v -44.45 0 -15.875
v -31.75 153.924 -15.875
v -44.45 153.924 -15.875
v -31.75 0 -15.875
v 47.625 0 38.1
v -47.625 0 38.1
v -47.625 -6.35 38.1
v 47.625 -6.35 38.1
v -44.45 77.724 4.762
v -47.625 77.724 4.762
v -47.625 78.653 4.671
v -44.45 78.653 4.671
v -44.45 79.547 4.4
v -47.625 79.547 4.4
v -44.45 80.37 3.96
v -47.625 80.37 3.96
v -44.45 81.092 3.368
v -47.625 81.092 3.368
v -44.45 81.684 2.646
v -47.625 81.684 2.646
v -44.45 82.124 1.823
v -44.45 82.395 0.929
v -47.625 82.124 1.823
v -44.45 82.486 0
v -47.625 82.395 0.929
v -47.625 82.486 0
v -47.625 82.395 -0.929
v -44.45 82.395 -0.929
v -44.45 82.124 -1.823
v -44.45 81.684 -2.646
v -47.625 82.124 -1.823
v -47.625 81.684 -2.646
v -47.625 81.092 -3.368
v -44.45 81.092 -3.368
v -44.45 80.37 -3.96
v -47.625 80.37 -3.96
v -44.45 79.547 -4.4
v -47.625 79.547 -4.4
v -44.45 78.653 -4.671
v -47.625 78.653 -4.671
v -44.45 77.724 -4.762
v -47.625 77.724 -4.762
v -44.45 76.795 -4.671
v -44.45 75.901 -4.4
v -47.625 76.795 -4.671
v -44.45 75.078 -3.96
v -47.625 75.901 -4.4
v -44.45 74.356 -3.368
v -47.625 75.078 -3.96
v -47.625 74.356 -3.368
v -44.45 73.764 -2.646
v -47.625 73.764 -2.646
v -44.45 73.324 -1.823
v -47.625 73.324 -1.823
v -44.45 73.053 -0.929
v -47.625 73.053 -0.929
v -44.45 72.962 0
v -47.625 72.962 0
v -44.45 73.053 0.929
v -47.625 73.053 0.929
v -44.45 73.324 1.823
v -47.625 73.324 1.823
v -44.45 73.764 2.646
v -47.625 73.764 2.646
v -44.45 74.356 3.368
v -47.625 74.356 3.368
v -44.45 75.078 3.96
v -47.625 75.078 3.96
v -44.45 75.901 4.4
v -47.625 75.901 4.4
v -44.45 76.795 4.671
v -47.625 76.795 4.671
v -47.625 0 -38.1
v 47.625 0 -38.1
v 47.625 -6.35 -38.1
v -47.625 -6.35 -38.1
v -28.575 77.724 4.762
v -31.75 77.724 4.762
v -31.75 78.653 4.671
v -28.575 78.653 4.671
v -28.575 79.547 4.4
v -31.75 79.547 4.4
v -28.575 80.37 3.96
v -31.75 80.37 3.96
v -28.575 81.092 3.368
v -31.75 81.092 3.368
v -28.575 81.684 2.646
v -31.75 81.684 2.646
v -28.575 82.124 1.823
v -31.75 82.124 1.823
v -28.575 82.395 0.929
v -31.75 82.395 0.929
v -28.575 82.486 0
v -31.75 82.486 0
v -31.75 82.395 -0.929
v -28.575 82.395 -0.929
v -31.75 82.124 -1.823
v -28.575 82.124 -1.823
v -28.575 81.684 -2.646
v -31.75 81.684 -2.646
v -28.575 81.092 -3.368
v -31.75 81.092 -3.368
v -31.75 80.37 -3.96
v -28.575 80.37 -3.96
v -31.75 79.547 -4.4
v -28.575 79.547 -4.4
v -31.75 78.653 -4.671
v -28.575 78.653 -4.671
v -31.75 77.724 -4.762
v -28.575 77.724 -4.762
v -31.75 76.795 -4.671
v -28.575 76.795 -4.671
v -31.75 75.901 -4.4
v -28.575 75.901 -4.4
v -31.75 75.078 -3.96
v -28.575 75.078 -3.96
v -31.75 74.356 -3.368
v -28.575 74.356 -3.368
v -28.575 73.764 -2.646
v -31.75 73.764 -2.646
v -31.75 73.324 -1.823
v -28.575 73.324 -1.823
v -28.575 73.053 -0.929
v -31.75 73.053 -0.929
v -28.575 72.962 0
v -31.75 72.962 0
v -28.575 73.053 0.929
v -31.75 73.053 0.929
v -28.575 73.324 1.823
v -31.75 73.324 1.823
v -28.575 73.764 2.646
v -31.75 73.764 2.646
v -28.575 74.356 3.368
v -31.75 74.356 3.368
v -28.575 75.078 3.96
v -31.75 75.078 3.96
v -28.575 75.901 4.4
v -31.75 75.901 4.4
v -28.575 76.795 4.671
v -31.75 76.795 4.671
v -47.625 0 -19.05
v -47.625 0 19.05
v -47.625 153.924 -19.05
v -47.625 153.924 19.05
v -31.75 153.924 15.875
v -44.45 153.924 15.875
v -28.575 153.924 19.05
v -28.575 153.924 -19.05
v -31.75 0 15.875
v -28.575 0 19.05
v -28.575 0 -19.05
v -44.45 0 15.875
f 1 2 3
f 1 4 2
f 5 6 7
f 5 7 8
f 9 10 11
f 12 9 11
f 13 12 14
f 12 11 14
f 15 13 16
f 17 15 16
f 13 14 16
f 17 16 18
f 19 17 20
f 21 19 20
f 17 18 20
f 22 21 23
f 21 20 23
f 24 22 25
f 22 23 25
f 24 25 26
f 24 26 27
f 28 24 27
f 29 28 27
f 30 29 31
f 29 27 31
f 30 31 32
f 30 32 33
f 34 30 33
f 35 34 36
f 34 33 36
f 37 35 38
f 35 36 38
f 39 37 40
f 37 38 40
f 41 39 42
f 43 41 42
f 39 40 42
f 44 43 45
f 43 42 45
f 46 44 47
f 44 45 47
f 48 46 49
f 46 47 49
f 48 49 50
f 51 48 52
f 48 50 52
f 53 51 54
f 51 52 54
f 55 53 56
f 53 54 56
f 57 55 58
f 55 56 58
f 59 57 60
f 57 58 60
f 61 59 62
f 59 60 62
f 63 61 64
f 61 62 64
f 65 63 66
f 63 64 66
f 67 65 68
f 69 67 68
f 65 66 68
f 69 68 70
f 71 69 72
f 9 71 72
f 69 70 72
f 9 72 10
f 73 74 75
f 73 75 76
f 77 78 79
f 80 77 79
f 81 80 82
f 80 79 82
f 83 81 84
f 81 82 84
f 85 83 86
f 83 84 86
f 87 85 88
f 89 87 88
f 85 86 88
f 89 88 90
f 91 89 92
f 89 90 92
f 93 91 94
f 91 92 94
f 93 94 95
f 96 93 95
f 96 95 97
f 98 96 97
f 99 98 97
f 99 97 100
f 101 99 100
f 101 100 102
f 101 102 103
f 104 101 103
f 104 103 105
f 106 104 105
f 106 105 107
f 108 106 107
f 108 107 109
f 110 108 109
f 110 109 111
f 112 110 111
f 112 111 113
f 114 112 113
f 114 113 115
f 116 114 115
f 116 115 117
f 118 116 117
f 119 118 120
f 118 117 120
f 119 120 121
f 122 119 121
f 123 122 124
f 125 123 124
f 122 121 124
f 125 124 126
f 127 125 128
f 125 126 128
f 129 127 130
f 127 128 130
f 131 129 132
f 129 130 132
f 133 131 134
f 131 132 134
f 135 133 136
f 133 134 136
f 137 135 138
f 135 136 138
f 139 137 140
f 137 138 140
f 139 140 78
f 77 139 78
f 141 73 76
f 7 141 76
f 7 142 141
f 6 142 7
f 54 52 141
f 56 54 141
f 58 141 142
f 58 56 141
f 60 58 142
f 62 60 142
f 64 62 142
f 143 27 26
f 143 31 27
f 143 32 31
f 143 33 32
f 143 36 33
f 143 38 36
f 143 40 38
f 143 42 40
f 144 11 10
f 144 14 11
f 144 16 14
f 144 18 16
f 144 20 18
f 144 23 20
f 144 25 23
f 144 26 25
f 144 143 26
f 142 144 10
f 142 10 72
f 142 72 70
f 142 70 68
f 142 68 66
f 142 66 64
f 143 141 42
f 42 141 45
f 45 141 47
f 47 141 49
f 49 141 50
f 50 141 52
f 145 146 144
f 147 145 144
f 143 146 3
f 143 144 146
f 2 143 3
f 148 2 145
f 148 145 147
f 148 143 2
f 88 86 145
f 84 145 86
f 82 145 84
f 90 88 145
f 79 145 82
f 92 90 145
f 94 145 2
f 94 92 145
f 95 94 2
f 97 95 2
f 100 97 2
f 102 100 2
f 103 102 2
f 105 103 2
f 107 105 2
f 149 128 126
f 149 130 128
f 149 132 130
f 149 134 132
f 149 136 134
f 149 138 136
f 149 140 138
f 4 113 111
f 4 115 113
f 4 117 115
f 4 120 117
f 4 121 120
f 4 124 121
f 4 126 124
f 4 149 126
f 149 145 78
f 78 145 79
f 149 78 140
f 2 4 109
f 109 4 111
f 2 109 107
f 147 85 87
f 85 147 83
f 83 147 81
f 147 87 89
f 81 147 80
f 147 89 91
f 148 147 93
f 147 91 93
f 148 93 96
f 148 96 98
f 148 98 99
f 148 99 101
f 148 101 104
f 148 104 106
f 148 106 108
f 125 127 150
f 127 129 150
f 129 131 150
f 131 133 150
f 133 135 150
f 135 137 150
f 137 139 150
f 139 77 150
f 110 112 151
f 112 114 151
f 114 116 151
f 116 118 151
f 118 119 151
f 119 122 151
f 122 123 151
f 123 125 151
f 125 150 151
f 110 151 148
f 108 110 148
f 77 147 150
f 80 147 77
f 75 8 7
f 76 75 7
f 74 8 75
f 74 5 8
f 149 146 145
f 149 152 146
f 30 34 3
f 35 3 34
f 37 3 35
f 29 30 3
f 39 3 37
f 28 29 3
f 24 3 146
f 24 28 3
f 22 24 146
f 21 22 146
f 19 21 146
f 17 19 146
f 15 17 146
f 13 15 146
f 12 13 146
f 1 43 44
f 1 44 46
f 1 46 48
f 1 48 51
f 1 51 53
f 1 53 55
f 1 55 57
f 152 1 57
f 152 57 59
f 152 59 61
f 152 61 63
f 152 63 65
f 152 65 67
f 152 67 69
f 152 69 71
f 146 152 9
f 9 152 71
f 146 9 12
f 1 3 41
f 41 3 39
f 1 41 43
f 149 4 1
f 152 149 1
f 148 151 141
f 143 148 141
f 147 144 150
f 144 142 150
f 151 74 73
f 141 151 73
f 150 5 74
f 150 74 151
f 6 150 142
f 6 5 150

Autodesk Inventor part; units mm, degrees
ref_plane "YZ Plane" through (0, 0, 0) normal (1, 0, 0) x (0, 1, 0)
ref_plane "XZ Plane" through (0, 0, 0) normal (0, 1, 0) x (-1, 0, 0)
ref_plane "XY Plane" through (0, 0, 0) normal (0, 0, 1) x (1, 0, 0)
sketch "Sketch1" plane through (0, 0, 0) normal (0, 1, 0) x (-1, 0, 0)
  line L0 (47.625, 38.1) -> (-47.625, 38.1)
  line L1 (-47.625, 38.1) -> (-47.625, -38.1)
  line L2 (-47.625, -38.1) -> (47.625, -38.1)
  line L3 (47.625, -38.1) -> (47.625, 38.1)
  line L4 (47.625, 38.1) -> (-47.625, -38.1) construction
  line L5 (-47.625, 38.1) -> (47.625, -38.1) construction
  point P0 (0, 0)
  dimension "d0" = 95.25
  dimension "d1" = 76.2
extrude "Extrusion1" add sketch "Sketch1" against normal blind 6.35
sketch "Sketch4" plane through (0, 0, 0) normal (0, 1, 0) x (1, 0, 0)
  line L0 (-47.625, -19.05) -> (-28.575, -19.05)
  line L1 (-28.575, -19.05) -> (-28.575, 19.05)
  line L2 (-28.575, 19.05) -> (-47.625, 19.05)
  line L3 (-47.625, 19.05) -> (-47.625, -19.05)
  line L4 (-47.625, -19.05) -> (-28.575, 19.05) construction
  line L5 (-28.575, -19.05) -> (-47.625, 19.05) construction
  line L6 (-47.625, 38.1) -> (-47.625, -38.1) projected
  line L7 (-44.45, -15.875) -> (-31.75, -15.875)
  line L8 (-31.75, -15.875) -> (-31.75, 15.875)
  line L9 (-31.75, 15.875) -> (-44.45, 15.875)
  line L10 (-44.45, 15.875) -> (-44.45, -15.875)
  line L11 (-44.45, -15.875) -> (-31.75, 15.875) construction
  line L12 (-31.75, -15.875) -> (-44.45, 15.875) construction
  point P0 (0, 0)
  point P1 (-38.1, 0)
  dimension "d8" = 0
  dimension "d9" = 38.1
  dimension "d10" = 19.05
  dimension "d11" = 3.175
  dimension "d12" = 3.175
extrude "Extrusion2" add sketch "Sketch4" along normal blind 153.924
sketch "Sketch5" plane through (-47.625, -6.35, -38.1) normal (-1, 0, 0) x (0, 0, 1)
  circle A0 centre (38.1, 84.074) radius 4.7625
  line L0 (19.05, 160.274) -> (57.15, 160.274) projected
  point P0 (38.1, 6.35)
  dimension "d15" = 9.525
  dimension "d16" = 76.2
extrude "Extrusion3" cut sketch "Sketch5" against normal through all
equation "\"d0\" = baseWidth"
equation "\"d1\" = baseLength"
equation "\"d2\" = baseThickness"
equation "\"d9\" = postLength"
equation "\"d10\" = postWidth"
equation "\"d11\" = postWallThickness"
equation "\"d12\" = postWallThickness"
equation "\"d13\" = postHeight"
equation "\"d15\" = postAxelDiam"
equation "\"d16\" = heightFromTopToAxelCenter"
equation "\"d17\" = postHeight"
equation "\"baseWidth\" = 95.25"
equation "\"baseLength\" = 76.2"
equation "\"baseThickness\" = 6.35"
equation "\"postWidth\" = 19.05"
equation "\"postLength\" = 38.1"
equation "\"postWallThickness\" = 3.175"
equation "\"postHeight\" = 153.924"
equation "\"postAxelDiam\" = 9.525"
equation "\"heightFromTopToAxelCenter\" = 76.2"
properties part number "BasePostForSideOfRobot"
